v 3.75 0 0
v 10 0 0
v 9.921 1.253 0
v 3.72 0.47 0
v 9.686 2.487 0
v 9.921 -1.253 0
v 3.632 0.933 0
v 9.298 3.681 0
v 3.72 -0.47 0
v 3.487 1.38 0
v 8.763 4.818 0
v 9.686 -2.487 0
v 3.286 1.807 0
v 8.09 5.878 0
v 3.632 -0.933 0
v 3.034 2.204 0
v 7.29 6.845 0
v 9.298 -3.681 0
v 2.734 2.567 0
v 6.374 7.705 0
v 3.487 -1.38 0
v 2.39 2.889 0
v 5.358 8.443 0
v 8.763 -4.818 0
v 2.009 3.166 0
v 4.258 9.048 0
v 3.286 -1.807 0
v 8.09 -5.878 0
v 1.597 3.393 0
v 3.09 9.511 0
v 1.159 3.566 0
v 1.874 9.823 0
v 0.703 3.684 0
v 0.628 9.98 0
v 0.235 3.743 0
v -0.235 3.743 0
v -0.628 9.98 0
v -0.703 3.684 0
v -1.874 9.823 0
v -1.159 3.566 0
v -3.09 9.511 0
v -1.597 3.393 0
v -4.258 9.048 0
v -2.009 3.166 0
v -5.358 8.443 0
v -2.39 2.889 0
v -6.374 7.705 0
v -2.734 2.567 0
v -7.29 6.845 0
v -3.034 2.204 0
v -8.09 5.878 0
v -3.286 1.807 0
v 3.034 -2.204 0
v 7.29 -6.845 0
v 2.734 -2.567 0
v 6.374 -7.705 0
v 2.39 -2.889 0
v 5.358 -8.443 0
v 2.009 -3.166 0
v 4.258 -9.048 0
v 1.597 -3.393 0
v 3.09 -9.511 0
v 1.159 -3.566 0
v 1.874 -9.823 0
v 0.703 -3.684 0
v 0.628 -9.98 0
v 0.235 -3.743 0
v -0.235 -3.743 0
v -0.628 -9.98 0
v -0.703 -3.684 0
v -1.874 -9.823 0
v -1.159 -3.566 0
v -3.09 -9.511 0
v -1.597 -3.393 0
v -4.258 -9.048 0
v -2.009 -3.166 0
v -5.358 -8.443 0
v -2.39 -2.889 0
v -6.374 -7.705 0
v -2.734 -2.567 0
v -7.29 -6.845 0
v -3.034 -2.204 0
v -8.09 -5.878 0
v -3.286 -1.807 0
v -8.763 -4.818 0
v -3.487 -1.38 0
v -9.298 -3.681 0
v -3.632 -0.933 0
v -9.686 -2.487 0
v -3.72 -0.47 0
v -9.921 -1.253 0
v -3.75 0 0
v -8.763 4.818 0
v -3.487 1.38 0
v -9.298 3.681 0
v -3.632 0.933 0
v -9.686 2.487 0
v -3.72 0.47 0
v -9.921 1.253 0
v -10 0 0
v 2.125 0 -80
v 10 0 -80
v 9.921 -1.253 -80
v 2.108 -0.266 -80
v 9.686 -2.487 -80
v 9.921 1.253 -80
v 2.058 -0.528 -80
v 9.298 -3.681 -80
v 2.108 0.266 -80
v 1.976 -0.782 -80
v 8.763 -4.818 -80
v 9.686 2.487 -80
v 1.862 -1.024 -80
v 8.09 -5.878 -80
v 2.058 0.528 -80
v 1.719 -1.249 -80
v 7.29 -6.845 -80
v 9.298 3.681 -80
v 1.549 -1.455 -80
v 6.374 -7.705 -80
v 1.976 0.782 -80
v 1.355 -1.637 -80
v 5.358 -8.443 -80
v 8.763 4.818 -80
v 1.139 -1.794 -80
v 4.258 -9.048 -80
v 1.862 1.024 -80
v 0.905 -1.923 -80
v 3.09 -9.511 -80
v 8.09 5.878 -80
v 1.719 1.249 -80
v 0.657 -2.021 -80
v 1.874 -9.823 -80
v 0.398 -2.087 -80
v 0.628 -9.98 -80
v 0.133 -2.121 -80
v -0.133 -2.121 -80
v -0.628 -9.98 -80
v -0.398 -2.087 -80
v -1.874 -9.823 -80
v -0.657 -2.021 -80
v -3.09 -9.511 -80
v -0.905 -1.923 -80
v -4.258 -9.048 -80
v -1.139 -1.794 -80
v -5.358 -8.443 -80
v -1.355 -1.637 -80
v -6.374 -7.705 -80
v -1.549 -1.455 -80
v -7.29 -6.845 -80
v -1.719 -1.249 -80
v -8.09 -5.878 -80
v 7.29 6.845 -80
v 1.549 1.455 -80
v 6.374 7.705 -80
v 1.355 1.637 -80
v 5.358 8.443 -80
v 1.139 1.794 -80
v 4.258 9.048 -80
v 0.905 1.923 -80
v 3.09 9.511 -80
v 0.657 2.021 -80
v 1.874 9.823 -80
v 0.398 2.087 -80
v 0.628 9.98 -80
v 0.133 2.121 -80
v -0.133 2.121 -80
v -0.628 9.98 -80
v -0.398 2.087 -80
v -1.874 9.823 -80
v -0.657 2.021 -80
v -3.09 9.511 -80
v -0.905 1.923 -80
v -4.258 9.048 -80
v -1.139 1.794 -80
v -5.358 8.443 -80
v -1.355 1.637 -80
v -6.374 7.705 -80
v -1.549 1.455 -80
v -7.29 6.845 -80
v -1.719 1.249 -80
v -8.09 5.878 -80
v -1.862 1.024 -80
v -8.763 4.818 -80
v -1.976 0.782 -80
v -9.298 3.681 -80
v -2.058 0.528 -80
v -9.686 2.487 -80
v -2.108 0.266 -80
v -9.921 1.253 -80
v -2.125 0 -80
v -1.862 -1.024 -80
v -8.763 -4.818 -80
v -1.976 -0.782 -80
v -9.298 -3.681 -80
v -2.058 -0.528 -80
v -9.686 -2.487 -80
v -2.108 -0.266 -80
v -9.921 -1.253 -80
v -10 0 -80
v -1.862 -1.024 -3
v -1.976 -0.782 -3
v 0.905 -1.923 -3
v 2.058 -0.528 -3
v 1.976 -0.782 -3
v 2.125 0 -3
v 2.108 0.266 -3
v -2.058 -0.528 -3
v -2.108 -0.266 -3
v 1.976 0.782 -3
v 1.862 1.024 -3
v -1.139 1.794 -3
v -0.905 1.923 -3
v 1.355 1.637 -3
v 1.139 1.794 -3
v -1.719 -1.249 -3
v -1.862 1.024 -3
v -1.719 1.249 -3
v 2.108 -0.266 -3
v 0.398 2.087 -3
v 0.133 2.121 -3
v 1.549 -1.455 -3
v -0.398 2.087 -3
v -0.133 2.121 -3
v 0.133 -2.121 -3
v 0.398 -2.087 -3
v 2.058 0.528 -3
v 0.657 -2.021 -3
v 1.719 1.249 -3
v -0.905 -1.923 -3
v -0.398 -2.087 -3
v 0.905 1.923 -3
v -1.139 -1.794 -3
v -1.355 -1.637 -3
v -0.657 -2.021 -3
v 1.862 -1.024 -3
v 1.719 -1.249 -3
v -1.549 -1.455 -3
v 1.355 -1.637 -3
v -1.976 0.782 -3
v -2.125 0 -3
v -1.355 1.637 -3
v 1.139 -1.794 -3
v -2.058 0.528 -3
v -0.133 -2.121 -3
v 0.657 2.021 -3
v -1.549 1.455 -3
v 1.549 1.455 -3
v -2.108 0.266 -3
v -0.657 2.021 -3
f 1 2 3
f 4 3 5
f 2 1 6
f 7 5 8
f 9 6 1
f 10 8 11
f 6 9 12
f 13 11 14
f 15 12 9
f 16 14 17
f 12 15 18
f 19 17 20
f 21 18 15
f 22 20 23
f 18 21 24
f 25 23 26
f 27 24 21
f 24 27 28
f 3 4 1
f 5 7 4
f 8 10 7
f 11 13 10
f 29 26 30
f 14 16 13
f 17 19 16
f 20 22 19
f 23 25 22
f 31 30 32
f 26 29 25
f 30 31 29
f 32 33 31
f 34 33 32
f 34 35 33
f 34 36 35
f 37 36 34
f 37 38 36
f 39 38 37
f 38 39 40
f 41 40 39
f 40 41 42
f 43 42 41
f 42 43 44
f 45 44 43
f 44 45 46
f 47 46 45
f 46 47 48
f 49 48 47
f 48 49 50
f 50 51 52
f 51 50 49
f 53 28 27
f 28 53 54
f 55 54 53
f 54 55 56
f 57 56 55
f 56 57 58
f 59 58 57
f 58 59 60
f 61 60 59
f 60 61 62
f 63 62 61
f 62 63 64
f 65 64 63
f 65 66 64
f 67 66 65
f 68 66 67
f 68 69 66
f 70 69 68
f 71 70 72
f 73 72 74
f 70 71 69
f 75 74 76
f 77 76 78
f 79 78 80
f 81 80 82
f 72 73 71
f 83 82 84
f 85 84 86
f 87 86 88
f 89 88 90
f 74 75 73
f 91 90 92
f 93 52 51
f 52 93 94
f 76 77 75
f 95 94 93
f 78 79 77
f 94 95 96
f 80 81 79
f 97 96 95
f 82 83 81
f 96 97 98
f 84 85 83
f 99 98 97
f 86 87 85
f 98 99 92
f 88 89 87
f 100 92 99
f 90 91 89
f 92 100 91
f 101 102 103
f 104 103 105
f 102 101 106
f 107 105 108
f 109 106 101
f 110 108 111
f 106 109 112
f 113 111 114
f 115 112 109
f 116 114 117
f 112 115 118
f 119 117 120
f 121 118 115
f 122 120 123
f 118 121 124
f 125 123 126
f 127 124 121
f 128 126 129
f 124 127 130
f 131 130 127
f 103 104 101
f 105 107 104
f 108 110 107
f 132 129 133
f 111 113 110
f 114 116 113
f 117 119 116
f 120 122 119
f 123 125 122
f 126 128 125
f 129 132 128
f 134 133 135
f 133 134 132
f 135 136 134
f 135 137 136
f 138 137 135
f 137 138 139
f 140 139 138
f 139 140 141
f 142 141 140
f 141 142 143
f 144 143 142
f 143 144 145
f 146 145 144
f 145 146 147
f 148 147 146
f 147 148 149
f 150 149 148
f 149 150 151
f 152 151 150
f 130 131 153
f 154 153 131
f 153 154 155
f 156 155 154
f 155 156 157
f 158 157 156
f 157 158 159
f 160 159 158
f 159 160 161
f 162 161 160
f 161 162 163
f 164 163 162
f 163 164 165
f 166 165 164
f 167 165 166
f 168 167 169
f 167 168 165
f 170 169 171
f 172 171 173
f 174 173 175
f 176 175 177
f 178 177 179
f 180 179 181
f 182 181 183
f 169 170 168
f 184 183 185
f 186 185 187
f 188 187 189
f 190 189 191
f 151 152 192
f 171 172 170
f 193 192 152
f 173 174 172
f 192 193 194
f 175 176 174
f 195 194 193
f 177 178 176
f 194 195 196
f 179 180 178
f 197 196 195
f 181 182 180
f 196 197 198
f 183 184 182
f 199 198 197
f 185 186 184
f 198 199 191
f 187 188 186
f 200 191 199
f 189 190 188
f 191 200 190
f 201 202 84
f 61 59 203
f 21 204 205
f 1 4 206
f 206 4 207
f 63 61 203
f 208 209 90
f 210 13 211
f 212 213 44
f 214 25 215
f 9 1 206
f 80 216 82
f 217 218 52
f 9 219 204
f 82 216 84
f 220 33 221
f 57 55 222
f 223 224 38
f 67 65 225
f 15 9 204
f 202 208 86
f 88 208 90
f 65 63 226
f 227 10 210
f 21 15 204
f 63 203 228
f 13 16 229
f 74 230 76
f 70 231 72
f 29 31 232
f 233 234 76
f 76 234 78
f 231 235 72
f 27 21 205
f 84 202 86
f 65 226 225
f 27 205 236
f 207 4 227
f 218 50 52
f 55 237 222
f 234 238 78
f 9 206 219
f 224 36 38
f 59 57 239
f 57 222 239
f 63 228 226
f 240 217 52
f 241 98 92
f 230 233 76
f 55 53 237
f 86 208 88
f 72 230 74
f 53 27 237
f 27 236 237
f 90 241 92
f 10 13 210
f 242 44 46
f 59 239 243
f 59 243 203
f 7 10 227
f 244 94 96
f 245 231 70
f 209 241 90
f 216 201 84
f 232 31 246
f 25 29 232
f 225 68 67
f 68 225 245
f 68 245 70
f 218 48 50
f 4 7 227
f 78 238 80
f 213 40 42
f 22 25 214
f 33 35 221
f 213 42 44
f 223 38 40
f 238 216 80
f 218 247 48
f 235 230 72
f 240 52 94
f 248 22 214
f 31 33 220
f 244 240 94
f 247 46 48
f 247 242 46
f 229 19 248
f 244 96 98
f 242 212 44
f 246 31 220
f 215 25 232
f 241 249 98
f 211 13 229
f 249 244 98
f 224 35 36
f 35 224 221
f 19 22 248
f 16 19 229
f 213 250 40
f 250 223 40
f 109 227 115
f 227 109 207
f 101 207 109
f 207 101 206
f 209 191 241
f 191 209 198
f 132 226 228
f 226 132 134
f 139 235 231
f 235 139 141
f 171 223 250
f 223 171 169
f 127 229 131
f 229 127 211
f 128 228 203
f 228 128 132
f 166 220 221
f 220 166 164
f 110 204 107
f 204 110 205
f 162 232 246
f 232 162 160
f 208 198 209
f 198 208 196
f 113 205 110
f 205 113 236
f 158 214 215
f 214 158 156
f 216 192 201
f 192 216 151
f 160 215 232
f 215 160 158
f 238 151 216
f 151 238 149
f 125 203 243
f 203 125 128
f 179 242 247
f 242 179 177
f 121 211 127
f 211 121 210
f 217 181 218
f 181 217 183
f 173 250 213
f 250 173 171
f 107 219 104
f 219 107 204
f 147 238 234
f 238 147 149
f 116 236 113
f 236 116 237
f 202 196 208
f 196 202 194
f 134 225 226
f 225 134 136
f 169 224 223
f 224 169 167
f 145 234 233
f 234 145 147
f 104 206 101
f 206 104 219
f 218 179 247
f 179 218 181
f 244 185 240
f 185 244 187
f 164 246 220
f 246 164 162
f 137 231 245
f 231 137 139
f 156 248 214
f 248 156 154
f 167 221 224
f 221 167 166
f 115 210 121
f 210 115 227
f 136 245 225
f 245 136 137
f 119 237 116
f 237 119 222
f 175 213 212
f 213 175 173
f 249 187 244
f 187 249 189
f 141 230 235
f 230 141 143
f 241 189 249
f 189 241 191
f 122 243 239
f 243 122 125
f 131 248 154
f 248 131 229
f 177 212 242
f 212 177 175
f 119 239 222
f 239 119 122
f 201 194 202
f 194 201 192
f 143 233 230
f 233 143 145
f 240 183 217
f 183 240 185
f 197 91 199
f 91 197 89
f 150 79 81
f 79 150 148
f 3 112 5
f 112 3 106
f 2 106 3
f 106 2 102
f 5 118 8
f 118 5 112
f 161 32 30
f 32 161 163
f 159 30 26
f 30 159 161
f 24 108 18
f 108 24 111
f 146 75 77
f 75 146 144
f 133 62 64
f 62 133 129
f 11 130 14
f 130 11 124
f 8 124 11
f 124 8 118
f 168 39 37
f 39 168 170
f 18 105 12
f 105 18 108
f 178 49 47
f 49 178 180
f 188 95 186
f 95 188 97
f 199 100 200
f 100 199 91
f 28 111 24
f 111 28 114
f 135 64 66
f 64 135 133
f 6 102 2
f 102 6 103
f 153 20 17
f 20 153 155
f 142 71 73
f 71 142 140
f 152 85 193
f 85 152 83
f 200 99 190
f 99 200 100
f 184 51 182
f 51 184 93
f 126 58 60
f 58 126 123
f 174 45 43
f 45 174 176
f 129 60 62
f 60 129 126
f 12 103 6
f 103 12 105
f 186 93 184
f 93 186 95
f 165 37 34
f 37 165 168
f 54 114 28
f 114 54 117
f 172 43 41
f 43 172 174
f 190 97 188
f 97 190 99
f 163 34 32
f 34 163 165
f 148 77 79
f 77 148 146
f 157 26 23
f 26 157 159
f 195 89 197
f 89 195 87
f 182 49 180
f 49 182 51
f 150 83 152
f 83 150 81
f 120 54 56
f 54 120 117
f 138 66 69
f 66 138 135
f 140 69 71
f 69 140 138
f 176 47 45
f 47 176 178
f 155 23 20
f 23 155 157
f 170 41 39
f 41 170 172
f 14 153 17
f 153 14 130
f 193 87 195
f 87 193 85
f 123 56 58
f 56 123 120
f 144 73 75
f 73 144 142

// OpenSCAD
$fn = 50;


difference() {
	union() {
		translate(v = [0, 0, -80.0000000000]) {
			cylinder(h = 80, r = 10.0000000000);
		}
	}
	union() {
		translate(v = [0, 0, 0]) {
			rotate(a = [0, 0, 0]) {
				difference() {
					union() {
						#translate(v = [0, 0, -80.0000000000]) {
							cylinder(h = 80, r = 2.0000000000);
						}
						#translate(v = [0, 0, -3]) {
							cylinder(h = 3, r1 = 2.1250000000, r2 = 3.7500000000);
						}
						#translate(v = [0, 0, -80.0000000000]) {
							cylinder(h = 80, r = 2.1250000000);
						}
						#translate(v = [0, 0, -80.0000000000]) {
							cylinder(h = 80, r = 2.0000000000);
						}
					}
					union();
				}
			}
		}
	}
}
